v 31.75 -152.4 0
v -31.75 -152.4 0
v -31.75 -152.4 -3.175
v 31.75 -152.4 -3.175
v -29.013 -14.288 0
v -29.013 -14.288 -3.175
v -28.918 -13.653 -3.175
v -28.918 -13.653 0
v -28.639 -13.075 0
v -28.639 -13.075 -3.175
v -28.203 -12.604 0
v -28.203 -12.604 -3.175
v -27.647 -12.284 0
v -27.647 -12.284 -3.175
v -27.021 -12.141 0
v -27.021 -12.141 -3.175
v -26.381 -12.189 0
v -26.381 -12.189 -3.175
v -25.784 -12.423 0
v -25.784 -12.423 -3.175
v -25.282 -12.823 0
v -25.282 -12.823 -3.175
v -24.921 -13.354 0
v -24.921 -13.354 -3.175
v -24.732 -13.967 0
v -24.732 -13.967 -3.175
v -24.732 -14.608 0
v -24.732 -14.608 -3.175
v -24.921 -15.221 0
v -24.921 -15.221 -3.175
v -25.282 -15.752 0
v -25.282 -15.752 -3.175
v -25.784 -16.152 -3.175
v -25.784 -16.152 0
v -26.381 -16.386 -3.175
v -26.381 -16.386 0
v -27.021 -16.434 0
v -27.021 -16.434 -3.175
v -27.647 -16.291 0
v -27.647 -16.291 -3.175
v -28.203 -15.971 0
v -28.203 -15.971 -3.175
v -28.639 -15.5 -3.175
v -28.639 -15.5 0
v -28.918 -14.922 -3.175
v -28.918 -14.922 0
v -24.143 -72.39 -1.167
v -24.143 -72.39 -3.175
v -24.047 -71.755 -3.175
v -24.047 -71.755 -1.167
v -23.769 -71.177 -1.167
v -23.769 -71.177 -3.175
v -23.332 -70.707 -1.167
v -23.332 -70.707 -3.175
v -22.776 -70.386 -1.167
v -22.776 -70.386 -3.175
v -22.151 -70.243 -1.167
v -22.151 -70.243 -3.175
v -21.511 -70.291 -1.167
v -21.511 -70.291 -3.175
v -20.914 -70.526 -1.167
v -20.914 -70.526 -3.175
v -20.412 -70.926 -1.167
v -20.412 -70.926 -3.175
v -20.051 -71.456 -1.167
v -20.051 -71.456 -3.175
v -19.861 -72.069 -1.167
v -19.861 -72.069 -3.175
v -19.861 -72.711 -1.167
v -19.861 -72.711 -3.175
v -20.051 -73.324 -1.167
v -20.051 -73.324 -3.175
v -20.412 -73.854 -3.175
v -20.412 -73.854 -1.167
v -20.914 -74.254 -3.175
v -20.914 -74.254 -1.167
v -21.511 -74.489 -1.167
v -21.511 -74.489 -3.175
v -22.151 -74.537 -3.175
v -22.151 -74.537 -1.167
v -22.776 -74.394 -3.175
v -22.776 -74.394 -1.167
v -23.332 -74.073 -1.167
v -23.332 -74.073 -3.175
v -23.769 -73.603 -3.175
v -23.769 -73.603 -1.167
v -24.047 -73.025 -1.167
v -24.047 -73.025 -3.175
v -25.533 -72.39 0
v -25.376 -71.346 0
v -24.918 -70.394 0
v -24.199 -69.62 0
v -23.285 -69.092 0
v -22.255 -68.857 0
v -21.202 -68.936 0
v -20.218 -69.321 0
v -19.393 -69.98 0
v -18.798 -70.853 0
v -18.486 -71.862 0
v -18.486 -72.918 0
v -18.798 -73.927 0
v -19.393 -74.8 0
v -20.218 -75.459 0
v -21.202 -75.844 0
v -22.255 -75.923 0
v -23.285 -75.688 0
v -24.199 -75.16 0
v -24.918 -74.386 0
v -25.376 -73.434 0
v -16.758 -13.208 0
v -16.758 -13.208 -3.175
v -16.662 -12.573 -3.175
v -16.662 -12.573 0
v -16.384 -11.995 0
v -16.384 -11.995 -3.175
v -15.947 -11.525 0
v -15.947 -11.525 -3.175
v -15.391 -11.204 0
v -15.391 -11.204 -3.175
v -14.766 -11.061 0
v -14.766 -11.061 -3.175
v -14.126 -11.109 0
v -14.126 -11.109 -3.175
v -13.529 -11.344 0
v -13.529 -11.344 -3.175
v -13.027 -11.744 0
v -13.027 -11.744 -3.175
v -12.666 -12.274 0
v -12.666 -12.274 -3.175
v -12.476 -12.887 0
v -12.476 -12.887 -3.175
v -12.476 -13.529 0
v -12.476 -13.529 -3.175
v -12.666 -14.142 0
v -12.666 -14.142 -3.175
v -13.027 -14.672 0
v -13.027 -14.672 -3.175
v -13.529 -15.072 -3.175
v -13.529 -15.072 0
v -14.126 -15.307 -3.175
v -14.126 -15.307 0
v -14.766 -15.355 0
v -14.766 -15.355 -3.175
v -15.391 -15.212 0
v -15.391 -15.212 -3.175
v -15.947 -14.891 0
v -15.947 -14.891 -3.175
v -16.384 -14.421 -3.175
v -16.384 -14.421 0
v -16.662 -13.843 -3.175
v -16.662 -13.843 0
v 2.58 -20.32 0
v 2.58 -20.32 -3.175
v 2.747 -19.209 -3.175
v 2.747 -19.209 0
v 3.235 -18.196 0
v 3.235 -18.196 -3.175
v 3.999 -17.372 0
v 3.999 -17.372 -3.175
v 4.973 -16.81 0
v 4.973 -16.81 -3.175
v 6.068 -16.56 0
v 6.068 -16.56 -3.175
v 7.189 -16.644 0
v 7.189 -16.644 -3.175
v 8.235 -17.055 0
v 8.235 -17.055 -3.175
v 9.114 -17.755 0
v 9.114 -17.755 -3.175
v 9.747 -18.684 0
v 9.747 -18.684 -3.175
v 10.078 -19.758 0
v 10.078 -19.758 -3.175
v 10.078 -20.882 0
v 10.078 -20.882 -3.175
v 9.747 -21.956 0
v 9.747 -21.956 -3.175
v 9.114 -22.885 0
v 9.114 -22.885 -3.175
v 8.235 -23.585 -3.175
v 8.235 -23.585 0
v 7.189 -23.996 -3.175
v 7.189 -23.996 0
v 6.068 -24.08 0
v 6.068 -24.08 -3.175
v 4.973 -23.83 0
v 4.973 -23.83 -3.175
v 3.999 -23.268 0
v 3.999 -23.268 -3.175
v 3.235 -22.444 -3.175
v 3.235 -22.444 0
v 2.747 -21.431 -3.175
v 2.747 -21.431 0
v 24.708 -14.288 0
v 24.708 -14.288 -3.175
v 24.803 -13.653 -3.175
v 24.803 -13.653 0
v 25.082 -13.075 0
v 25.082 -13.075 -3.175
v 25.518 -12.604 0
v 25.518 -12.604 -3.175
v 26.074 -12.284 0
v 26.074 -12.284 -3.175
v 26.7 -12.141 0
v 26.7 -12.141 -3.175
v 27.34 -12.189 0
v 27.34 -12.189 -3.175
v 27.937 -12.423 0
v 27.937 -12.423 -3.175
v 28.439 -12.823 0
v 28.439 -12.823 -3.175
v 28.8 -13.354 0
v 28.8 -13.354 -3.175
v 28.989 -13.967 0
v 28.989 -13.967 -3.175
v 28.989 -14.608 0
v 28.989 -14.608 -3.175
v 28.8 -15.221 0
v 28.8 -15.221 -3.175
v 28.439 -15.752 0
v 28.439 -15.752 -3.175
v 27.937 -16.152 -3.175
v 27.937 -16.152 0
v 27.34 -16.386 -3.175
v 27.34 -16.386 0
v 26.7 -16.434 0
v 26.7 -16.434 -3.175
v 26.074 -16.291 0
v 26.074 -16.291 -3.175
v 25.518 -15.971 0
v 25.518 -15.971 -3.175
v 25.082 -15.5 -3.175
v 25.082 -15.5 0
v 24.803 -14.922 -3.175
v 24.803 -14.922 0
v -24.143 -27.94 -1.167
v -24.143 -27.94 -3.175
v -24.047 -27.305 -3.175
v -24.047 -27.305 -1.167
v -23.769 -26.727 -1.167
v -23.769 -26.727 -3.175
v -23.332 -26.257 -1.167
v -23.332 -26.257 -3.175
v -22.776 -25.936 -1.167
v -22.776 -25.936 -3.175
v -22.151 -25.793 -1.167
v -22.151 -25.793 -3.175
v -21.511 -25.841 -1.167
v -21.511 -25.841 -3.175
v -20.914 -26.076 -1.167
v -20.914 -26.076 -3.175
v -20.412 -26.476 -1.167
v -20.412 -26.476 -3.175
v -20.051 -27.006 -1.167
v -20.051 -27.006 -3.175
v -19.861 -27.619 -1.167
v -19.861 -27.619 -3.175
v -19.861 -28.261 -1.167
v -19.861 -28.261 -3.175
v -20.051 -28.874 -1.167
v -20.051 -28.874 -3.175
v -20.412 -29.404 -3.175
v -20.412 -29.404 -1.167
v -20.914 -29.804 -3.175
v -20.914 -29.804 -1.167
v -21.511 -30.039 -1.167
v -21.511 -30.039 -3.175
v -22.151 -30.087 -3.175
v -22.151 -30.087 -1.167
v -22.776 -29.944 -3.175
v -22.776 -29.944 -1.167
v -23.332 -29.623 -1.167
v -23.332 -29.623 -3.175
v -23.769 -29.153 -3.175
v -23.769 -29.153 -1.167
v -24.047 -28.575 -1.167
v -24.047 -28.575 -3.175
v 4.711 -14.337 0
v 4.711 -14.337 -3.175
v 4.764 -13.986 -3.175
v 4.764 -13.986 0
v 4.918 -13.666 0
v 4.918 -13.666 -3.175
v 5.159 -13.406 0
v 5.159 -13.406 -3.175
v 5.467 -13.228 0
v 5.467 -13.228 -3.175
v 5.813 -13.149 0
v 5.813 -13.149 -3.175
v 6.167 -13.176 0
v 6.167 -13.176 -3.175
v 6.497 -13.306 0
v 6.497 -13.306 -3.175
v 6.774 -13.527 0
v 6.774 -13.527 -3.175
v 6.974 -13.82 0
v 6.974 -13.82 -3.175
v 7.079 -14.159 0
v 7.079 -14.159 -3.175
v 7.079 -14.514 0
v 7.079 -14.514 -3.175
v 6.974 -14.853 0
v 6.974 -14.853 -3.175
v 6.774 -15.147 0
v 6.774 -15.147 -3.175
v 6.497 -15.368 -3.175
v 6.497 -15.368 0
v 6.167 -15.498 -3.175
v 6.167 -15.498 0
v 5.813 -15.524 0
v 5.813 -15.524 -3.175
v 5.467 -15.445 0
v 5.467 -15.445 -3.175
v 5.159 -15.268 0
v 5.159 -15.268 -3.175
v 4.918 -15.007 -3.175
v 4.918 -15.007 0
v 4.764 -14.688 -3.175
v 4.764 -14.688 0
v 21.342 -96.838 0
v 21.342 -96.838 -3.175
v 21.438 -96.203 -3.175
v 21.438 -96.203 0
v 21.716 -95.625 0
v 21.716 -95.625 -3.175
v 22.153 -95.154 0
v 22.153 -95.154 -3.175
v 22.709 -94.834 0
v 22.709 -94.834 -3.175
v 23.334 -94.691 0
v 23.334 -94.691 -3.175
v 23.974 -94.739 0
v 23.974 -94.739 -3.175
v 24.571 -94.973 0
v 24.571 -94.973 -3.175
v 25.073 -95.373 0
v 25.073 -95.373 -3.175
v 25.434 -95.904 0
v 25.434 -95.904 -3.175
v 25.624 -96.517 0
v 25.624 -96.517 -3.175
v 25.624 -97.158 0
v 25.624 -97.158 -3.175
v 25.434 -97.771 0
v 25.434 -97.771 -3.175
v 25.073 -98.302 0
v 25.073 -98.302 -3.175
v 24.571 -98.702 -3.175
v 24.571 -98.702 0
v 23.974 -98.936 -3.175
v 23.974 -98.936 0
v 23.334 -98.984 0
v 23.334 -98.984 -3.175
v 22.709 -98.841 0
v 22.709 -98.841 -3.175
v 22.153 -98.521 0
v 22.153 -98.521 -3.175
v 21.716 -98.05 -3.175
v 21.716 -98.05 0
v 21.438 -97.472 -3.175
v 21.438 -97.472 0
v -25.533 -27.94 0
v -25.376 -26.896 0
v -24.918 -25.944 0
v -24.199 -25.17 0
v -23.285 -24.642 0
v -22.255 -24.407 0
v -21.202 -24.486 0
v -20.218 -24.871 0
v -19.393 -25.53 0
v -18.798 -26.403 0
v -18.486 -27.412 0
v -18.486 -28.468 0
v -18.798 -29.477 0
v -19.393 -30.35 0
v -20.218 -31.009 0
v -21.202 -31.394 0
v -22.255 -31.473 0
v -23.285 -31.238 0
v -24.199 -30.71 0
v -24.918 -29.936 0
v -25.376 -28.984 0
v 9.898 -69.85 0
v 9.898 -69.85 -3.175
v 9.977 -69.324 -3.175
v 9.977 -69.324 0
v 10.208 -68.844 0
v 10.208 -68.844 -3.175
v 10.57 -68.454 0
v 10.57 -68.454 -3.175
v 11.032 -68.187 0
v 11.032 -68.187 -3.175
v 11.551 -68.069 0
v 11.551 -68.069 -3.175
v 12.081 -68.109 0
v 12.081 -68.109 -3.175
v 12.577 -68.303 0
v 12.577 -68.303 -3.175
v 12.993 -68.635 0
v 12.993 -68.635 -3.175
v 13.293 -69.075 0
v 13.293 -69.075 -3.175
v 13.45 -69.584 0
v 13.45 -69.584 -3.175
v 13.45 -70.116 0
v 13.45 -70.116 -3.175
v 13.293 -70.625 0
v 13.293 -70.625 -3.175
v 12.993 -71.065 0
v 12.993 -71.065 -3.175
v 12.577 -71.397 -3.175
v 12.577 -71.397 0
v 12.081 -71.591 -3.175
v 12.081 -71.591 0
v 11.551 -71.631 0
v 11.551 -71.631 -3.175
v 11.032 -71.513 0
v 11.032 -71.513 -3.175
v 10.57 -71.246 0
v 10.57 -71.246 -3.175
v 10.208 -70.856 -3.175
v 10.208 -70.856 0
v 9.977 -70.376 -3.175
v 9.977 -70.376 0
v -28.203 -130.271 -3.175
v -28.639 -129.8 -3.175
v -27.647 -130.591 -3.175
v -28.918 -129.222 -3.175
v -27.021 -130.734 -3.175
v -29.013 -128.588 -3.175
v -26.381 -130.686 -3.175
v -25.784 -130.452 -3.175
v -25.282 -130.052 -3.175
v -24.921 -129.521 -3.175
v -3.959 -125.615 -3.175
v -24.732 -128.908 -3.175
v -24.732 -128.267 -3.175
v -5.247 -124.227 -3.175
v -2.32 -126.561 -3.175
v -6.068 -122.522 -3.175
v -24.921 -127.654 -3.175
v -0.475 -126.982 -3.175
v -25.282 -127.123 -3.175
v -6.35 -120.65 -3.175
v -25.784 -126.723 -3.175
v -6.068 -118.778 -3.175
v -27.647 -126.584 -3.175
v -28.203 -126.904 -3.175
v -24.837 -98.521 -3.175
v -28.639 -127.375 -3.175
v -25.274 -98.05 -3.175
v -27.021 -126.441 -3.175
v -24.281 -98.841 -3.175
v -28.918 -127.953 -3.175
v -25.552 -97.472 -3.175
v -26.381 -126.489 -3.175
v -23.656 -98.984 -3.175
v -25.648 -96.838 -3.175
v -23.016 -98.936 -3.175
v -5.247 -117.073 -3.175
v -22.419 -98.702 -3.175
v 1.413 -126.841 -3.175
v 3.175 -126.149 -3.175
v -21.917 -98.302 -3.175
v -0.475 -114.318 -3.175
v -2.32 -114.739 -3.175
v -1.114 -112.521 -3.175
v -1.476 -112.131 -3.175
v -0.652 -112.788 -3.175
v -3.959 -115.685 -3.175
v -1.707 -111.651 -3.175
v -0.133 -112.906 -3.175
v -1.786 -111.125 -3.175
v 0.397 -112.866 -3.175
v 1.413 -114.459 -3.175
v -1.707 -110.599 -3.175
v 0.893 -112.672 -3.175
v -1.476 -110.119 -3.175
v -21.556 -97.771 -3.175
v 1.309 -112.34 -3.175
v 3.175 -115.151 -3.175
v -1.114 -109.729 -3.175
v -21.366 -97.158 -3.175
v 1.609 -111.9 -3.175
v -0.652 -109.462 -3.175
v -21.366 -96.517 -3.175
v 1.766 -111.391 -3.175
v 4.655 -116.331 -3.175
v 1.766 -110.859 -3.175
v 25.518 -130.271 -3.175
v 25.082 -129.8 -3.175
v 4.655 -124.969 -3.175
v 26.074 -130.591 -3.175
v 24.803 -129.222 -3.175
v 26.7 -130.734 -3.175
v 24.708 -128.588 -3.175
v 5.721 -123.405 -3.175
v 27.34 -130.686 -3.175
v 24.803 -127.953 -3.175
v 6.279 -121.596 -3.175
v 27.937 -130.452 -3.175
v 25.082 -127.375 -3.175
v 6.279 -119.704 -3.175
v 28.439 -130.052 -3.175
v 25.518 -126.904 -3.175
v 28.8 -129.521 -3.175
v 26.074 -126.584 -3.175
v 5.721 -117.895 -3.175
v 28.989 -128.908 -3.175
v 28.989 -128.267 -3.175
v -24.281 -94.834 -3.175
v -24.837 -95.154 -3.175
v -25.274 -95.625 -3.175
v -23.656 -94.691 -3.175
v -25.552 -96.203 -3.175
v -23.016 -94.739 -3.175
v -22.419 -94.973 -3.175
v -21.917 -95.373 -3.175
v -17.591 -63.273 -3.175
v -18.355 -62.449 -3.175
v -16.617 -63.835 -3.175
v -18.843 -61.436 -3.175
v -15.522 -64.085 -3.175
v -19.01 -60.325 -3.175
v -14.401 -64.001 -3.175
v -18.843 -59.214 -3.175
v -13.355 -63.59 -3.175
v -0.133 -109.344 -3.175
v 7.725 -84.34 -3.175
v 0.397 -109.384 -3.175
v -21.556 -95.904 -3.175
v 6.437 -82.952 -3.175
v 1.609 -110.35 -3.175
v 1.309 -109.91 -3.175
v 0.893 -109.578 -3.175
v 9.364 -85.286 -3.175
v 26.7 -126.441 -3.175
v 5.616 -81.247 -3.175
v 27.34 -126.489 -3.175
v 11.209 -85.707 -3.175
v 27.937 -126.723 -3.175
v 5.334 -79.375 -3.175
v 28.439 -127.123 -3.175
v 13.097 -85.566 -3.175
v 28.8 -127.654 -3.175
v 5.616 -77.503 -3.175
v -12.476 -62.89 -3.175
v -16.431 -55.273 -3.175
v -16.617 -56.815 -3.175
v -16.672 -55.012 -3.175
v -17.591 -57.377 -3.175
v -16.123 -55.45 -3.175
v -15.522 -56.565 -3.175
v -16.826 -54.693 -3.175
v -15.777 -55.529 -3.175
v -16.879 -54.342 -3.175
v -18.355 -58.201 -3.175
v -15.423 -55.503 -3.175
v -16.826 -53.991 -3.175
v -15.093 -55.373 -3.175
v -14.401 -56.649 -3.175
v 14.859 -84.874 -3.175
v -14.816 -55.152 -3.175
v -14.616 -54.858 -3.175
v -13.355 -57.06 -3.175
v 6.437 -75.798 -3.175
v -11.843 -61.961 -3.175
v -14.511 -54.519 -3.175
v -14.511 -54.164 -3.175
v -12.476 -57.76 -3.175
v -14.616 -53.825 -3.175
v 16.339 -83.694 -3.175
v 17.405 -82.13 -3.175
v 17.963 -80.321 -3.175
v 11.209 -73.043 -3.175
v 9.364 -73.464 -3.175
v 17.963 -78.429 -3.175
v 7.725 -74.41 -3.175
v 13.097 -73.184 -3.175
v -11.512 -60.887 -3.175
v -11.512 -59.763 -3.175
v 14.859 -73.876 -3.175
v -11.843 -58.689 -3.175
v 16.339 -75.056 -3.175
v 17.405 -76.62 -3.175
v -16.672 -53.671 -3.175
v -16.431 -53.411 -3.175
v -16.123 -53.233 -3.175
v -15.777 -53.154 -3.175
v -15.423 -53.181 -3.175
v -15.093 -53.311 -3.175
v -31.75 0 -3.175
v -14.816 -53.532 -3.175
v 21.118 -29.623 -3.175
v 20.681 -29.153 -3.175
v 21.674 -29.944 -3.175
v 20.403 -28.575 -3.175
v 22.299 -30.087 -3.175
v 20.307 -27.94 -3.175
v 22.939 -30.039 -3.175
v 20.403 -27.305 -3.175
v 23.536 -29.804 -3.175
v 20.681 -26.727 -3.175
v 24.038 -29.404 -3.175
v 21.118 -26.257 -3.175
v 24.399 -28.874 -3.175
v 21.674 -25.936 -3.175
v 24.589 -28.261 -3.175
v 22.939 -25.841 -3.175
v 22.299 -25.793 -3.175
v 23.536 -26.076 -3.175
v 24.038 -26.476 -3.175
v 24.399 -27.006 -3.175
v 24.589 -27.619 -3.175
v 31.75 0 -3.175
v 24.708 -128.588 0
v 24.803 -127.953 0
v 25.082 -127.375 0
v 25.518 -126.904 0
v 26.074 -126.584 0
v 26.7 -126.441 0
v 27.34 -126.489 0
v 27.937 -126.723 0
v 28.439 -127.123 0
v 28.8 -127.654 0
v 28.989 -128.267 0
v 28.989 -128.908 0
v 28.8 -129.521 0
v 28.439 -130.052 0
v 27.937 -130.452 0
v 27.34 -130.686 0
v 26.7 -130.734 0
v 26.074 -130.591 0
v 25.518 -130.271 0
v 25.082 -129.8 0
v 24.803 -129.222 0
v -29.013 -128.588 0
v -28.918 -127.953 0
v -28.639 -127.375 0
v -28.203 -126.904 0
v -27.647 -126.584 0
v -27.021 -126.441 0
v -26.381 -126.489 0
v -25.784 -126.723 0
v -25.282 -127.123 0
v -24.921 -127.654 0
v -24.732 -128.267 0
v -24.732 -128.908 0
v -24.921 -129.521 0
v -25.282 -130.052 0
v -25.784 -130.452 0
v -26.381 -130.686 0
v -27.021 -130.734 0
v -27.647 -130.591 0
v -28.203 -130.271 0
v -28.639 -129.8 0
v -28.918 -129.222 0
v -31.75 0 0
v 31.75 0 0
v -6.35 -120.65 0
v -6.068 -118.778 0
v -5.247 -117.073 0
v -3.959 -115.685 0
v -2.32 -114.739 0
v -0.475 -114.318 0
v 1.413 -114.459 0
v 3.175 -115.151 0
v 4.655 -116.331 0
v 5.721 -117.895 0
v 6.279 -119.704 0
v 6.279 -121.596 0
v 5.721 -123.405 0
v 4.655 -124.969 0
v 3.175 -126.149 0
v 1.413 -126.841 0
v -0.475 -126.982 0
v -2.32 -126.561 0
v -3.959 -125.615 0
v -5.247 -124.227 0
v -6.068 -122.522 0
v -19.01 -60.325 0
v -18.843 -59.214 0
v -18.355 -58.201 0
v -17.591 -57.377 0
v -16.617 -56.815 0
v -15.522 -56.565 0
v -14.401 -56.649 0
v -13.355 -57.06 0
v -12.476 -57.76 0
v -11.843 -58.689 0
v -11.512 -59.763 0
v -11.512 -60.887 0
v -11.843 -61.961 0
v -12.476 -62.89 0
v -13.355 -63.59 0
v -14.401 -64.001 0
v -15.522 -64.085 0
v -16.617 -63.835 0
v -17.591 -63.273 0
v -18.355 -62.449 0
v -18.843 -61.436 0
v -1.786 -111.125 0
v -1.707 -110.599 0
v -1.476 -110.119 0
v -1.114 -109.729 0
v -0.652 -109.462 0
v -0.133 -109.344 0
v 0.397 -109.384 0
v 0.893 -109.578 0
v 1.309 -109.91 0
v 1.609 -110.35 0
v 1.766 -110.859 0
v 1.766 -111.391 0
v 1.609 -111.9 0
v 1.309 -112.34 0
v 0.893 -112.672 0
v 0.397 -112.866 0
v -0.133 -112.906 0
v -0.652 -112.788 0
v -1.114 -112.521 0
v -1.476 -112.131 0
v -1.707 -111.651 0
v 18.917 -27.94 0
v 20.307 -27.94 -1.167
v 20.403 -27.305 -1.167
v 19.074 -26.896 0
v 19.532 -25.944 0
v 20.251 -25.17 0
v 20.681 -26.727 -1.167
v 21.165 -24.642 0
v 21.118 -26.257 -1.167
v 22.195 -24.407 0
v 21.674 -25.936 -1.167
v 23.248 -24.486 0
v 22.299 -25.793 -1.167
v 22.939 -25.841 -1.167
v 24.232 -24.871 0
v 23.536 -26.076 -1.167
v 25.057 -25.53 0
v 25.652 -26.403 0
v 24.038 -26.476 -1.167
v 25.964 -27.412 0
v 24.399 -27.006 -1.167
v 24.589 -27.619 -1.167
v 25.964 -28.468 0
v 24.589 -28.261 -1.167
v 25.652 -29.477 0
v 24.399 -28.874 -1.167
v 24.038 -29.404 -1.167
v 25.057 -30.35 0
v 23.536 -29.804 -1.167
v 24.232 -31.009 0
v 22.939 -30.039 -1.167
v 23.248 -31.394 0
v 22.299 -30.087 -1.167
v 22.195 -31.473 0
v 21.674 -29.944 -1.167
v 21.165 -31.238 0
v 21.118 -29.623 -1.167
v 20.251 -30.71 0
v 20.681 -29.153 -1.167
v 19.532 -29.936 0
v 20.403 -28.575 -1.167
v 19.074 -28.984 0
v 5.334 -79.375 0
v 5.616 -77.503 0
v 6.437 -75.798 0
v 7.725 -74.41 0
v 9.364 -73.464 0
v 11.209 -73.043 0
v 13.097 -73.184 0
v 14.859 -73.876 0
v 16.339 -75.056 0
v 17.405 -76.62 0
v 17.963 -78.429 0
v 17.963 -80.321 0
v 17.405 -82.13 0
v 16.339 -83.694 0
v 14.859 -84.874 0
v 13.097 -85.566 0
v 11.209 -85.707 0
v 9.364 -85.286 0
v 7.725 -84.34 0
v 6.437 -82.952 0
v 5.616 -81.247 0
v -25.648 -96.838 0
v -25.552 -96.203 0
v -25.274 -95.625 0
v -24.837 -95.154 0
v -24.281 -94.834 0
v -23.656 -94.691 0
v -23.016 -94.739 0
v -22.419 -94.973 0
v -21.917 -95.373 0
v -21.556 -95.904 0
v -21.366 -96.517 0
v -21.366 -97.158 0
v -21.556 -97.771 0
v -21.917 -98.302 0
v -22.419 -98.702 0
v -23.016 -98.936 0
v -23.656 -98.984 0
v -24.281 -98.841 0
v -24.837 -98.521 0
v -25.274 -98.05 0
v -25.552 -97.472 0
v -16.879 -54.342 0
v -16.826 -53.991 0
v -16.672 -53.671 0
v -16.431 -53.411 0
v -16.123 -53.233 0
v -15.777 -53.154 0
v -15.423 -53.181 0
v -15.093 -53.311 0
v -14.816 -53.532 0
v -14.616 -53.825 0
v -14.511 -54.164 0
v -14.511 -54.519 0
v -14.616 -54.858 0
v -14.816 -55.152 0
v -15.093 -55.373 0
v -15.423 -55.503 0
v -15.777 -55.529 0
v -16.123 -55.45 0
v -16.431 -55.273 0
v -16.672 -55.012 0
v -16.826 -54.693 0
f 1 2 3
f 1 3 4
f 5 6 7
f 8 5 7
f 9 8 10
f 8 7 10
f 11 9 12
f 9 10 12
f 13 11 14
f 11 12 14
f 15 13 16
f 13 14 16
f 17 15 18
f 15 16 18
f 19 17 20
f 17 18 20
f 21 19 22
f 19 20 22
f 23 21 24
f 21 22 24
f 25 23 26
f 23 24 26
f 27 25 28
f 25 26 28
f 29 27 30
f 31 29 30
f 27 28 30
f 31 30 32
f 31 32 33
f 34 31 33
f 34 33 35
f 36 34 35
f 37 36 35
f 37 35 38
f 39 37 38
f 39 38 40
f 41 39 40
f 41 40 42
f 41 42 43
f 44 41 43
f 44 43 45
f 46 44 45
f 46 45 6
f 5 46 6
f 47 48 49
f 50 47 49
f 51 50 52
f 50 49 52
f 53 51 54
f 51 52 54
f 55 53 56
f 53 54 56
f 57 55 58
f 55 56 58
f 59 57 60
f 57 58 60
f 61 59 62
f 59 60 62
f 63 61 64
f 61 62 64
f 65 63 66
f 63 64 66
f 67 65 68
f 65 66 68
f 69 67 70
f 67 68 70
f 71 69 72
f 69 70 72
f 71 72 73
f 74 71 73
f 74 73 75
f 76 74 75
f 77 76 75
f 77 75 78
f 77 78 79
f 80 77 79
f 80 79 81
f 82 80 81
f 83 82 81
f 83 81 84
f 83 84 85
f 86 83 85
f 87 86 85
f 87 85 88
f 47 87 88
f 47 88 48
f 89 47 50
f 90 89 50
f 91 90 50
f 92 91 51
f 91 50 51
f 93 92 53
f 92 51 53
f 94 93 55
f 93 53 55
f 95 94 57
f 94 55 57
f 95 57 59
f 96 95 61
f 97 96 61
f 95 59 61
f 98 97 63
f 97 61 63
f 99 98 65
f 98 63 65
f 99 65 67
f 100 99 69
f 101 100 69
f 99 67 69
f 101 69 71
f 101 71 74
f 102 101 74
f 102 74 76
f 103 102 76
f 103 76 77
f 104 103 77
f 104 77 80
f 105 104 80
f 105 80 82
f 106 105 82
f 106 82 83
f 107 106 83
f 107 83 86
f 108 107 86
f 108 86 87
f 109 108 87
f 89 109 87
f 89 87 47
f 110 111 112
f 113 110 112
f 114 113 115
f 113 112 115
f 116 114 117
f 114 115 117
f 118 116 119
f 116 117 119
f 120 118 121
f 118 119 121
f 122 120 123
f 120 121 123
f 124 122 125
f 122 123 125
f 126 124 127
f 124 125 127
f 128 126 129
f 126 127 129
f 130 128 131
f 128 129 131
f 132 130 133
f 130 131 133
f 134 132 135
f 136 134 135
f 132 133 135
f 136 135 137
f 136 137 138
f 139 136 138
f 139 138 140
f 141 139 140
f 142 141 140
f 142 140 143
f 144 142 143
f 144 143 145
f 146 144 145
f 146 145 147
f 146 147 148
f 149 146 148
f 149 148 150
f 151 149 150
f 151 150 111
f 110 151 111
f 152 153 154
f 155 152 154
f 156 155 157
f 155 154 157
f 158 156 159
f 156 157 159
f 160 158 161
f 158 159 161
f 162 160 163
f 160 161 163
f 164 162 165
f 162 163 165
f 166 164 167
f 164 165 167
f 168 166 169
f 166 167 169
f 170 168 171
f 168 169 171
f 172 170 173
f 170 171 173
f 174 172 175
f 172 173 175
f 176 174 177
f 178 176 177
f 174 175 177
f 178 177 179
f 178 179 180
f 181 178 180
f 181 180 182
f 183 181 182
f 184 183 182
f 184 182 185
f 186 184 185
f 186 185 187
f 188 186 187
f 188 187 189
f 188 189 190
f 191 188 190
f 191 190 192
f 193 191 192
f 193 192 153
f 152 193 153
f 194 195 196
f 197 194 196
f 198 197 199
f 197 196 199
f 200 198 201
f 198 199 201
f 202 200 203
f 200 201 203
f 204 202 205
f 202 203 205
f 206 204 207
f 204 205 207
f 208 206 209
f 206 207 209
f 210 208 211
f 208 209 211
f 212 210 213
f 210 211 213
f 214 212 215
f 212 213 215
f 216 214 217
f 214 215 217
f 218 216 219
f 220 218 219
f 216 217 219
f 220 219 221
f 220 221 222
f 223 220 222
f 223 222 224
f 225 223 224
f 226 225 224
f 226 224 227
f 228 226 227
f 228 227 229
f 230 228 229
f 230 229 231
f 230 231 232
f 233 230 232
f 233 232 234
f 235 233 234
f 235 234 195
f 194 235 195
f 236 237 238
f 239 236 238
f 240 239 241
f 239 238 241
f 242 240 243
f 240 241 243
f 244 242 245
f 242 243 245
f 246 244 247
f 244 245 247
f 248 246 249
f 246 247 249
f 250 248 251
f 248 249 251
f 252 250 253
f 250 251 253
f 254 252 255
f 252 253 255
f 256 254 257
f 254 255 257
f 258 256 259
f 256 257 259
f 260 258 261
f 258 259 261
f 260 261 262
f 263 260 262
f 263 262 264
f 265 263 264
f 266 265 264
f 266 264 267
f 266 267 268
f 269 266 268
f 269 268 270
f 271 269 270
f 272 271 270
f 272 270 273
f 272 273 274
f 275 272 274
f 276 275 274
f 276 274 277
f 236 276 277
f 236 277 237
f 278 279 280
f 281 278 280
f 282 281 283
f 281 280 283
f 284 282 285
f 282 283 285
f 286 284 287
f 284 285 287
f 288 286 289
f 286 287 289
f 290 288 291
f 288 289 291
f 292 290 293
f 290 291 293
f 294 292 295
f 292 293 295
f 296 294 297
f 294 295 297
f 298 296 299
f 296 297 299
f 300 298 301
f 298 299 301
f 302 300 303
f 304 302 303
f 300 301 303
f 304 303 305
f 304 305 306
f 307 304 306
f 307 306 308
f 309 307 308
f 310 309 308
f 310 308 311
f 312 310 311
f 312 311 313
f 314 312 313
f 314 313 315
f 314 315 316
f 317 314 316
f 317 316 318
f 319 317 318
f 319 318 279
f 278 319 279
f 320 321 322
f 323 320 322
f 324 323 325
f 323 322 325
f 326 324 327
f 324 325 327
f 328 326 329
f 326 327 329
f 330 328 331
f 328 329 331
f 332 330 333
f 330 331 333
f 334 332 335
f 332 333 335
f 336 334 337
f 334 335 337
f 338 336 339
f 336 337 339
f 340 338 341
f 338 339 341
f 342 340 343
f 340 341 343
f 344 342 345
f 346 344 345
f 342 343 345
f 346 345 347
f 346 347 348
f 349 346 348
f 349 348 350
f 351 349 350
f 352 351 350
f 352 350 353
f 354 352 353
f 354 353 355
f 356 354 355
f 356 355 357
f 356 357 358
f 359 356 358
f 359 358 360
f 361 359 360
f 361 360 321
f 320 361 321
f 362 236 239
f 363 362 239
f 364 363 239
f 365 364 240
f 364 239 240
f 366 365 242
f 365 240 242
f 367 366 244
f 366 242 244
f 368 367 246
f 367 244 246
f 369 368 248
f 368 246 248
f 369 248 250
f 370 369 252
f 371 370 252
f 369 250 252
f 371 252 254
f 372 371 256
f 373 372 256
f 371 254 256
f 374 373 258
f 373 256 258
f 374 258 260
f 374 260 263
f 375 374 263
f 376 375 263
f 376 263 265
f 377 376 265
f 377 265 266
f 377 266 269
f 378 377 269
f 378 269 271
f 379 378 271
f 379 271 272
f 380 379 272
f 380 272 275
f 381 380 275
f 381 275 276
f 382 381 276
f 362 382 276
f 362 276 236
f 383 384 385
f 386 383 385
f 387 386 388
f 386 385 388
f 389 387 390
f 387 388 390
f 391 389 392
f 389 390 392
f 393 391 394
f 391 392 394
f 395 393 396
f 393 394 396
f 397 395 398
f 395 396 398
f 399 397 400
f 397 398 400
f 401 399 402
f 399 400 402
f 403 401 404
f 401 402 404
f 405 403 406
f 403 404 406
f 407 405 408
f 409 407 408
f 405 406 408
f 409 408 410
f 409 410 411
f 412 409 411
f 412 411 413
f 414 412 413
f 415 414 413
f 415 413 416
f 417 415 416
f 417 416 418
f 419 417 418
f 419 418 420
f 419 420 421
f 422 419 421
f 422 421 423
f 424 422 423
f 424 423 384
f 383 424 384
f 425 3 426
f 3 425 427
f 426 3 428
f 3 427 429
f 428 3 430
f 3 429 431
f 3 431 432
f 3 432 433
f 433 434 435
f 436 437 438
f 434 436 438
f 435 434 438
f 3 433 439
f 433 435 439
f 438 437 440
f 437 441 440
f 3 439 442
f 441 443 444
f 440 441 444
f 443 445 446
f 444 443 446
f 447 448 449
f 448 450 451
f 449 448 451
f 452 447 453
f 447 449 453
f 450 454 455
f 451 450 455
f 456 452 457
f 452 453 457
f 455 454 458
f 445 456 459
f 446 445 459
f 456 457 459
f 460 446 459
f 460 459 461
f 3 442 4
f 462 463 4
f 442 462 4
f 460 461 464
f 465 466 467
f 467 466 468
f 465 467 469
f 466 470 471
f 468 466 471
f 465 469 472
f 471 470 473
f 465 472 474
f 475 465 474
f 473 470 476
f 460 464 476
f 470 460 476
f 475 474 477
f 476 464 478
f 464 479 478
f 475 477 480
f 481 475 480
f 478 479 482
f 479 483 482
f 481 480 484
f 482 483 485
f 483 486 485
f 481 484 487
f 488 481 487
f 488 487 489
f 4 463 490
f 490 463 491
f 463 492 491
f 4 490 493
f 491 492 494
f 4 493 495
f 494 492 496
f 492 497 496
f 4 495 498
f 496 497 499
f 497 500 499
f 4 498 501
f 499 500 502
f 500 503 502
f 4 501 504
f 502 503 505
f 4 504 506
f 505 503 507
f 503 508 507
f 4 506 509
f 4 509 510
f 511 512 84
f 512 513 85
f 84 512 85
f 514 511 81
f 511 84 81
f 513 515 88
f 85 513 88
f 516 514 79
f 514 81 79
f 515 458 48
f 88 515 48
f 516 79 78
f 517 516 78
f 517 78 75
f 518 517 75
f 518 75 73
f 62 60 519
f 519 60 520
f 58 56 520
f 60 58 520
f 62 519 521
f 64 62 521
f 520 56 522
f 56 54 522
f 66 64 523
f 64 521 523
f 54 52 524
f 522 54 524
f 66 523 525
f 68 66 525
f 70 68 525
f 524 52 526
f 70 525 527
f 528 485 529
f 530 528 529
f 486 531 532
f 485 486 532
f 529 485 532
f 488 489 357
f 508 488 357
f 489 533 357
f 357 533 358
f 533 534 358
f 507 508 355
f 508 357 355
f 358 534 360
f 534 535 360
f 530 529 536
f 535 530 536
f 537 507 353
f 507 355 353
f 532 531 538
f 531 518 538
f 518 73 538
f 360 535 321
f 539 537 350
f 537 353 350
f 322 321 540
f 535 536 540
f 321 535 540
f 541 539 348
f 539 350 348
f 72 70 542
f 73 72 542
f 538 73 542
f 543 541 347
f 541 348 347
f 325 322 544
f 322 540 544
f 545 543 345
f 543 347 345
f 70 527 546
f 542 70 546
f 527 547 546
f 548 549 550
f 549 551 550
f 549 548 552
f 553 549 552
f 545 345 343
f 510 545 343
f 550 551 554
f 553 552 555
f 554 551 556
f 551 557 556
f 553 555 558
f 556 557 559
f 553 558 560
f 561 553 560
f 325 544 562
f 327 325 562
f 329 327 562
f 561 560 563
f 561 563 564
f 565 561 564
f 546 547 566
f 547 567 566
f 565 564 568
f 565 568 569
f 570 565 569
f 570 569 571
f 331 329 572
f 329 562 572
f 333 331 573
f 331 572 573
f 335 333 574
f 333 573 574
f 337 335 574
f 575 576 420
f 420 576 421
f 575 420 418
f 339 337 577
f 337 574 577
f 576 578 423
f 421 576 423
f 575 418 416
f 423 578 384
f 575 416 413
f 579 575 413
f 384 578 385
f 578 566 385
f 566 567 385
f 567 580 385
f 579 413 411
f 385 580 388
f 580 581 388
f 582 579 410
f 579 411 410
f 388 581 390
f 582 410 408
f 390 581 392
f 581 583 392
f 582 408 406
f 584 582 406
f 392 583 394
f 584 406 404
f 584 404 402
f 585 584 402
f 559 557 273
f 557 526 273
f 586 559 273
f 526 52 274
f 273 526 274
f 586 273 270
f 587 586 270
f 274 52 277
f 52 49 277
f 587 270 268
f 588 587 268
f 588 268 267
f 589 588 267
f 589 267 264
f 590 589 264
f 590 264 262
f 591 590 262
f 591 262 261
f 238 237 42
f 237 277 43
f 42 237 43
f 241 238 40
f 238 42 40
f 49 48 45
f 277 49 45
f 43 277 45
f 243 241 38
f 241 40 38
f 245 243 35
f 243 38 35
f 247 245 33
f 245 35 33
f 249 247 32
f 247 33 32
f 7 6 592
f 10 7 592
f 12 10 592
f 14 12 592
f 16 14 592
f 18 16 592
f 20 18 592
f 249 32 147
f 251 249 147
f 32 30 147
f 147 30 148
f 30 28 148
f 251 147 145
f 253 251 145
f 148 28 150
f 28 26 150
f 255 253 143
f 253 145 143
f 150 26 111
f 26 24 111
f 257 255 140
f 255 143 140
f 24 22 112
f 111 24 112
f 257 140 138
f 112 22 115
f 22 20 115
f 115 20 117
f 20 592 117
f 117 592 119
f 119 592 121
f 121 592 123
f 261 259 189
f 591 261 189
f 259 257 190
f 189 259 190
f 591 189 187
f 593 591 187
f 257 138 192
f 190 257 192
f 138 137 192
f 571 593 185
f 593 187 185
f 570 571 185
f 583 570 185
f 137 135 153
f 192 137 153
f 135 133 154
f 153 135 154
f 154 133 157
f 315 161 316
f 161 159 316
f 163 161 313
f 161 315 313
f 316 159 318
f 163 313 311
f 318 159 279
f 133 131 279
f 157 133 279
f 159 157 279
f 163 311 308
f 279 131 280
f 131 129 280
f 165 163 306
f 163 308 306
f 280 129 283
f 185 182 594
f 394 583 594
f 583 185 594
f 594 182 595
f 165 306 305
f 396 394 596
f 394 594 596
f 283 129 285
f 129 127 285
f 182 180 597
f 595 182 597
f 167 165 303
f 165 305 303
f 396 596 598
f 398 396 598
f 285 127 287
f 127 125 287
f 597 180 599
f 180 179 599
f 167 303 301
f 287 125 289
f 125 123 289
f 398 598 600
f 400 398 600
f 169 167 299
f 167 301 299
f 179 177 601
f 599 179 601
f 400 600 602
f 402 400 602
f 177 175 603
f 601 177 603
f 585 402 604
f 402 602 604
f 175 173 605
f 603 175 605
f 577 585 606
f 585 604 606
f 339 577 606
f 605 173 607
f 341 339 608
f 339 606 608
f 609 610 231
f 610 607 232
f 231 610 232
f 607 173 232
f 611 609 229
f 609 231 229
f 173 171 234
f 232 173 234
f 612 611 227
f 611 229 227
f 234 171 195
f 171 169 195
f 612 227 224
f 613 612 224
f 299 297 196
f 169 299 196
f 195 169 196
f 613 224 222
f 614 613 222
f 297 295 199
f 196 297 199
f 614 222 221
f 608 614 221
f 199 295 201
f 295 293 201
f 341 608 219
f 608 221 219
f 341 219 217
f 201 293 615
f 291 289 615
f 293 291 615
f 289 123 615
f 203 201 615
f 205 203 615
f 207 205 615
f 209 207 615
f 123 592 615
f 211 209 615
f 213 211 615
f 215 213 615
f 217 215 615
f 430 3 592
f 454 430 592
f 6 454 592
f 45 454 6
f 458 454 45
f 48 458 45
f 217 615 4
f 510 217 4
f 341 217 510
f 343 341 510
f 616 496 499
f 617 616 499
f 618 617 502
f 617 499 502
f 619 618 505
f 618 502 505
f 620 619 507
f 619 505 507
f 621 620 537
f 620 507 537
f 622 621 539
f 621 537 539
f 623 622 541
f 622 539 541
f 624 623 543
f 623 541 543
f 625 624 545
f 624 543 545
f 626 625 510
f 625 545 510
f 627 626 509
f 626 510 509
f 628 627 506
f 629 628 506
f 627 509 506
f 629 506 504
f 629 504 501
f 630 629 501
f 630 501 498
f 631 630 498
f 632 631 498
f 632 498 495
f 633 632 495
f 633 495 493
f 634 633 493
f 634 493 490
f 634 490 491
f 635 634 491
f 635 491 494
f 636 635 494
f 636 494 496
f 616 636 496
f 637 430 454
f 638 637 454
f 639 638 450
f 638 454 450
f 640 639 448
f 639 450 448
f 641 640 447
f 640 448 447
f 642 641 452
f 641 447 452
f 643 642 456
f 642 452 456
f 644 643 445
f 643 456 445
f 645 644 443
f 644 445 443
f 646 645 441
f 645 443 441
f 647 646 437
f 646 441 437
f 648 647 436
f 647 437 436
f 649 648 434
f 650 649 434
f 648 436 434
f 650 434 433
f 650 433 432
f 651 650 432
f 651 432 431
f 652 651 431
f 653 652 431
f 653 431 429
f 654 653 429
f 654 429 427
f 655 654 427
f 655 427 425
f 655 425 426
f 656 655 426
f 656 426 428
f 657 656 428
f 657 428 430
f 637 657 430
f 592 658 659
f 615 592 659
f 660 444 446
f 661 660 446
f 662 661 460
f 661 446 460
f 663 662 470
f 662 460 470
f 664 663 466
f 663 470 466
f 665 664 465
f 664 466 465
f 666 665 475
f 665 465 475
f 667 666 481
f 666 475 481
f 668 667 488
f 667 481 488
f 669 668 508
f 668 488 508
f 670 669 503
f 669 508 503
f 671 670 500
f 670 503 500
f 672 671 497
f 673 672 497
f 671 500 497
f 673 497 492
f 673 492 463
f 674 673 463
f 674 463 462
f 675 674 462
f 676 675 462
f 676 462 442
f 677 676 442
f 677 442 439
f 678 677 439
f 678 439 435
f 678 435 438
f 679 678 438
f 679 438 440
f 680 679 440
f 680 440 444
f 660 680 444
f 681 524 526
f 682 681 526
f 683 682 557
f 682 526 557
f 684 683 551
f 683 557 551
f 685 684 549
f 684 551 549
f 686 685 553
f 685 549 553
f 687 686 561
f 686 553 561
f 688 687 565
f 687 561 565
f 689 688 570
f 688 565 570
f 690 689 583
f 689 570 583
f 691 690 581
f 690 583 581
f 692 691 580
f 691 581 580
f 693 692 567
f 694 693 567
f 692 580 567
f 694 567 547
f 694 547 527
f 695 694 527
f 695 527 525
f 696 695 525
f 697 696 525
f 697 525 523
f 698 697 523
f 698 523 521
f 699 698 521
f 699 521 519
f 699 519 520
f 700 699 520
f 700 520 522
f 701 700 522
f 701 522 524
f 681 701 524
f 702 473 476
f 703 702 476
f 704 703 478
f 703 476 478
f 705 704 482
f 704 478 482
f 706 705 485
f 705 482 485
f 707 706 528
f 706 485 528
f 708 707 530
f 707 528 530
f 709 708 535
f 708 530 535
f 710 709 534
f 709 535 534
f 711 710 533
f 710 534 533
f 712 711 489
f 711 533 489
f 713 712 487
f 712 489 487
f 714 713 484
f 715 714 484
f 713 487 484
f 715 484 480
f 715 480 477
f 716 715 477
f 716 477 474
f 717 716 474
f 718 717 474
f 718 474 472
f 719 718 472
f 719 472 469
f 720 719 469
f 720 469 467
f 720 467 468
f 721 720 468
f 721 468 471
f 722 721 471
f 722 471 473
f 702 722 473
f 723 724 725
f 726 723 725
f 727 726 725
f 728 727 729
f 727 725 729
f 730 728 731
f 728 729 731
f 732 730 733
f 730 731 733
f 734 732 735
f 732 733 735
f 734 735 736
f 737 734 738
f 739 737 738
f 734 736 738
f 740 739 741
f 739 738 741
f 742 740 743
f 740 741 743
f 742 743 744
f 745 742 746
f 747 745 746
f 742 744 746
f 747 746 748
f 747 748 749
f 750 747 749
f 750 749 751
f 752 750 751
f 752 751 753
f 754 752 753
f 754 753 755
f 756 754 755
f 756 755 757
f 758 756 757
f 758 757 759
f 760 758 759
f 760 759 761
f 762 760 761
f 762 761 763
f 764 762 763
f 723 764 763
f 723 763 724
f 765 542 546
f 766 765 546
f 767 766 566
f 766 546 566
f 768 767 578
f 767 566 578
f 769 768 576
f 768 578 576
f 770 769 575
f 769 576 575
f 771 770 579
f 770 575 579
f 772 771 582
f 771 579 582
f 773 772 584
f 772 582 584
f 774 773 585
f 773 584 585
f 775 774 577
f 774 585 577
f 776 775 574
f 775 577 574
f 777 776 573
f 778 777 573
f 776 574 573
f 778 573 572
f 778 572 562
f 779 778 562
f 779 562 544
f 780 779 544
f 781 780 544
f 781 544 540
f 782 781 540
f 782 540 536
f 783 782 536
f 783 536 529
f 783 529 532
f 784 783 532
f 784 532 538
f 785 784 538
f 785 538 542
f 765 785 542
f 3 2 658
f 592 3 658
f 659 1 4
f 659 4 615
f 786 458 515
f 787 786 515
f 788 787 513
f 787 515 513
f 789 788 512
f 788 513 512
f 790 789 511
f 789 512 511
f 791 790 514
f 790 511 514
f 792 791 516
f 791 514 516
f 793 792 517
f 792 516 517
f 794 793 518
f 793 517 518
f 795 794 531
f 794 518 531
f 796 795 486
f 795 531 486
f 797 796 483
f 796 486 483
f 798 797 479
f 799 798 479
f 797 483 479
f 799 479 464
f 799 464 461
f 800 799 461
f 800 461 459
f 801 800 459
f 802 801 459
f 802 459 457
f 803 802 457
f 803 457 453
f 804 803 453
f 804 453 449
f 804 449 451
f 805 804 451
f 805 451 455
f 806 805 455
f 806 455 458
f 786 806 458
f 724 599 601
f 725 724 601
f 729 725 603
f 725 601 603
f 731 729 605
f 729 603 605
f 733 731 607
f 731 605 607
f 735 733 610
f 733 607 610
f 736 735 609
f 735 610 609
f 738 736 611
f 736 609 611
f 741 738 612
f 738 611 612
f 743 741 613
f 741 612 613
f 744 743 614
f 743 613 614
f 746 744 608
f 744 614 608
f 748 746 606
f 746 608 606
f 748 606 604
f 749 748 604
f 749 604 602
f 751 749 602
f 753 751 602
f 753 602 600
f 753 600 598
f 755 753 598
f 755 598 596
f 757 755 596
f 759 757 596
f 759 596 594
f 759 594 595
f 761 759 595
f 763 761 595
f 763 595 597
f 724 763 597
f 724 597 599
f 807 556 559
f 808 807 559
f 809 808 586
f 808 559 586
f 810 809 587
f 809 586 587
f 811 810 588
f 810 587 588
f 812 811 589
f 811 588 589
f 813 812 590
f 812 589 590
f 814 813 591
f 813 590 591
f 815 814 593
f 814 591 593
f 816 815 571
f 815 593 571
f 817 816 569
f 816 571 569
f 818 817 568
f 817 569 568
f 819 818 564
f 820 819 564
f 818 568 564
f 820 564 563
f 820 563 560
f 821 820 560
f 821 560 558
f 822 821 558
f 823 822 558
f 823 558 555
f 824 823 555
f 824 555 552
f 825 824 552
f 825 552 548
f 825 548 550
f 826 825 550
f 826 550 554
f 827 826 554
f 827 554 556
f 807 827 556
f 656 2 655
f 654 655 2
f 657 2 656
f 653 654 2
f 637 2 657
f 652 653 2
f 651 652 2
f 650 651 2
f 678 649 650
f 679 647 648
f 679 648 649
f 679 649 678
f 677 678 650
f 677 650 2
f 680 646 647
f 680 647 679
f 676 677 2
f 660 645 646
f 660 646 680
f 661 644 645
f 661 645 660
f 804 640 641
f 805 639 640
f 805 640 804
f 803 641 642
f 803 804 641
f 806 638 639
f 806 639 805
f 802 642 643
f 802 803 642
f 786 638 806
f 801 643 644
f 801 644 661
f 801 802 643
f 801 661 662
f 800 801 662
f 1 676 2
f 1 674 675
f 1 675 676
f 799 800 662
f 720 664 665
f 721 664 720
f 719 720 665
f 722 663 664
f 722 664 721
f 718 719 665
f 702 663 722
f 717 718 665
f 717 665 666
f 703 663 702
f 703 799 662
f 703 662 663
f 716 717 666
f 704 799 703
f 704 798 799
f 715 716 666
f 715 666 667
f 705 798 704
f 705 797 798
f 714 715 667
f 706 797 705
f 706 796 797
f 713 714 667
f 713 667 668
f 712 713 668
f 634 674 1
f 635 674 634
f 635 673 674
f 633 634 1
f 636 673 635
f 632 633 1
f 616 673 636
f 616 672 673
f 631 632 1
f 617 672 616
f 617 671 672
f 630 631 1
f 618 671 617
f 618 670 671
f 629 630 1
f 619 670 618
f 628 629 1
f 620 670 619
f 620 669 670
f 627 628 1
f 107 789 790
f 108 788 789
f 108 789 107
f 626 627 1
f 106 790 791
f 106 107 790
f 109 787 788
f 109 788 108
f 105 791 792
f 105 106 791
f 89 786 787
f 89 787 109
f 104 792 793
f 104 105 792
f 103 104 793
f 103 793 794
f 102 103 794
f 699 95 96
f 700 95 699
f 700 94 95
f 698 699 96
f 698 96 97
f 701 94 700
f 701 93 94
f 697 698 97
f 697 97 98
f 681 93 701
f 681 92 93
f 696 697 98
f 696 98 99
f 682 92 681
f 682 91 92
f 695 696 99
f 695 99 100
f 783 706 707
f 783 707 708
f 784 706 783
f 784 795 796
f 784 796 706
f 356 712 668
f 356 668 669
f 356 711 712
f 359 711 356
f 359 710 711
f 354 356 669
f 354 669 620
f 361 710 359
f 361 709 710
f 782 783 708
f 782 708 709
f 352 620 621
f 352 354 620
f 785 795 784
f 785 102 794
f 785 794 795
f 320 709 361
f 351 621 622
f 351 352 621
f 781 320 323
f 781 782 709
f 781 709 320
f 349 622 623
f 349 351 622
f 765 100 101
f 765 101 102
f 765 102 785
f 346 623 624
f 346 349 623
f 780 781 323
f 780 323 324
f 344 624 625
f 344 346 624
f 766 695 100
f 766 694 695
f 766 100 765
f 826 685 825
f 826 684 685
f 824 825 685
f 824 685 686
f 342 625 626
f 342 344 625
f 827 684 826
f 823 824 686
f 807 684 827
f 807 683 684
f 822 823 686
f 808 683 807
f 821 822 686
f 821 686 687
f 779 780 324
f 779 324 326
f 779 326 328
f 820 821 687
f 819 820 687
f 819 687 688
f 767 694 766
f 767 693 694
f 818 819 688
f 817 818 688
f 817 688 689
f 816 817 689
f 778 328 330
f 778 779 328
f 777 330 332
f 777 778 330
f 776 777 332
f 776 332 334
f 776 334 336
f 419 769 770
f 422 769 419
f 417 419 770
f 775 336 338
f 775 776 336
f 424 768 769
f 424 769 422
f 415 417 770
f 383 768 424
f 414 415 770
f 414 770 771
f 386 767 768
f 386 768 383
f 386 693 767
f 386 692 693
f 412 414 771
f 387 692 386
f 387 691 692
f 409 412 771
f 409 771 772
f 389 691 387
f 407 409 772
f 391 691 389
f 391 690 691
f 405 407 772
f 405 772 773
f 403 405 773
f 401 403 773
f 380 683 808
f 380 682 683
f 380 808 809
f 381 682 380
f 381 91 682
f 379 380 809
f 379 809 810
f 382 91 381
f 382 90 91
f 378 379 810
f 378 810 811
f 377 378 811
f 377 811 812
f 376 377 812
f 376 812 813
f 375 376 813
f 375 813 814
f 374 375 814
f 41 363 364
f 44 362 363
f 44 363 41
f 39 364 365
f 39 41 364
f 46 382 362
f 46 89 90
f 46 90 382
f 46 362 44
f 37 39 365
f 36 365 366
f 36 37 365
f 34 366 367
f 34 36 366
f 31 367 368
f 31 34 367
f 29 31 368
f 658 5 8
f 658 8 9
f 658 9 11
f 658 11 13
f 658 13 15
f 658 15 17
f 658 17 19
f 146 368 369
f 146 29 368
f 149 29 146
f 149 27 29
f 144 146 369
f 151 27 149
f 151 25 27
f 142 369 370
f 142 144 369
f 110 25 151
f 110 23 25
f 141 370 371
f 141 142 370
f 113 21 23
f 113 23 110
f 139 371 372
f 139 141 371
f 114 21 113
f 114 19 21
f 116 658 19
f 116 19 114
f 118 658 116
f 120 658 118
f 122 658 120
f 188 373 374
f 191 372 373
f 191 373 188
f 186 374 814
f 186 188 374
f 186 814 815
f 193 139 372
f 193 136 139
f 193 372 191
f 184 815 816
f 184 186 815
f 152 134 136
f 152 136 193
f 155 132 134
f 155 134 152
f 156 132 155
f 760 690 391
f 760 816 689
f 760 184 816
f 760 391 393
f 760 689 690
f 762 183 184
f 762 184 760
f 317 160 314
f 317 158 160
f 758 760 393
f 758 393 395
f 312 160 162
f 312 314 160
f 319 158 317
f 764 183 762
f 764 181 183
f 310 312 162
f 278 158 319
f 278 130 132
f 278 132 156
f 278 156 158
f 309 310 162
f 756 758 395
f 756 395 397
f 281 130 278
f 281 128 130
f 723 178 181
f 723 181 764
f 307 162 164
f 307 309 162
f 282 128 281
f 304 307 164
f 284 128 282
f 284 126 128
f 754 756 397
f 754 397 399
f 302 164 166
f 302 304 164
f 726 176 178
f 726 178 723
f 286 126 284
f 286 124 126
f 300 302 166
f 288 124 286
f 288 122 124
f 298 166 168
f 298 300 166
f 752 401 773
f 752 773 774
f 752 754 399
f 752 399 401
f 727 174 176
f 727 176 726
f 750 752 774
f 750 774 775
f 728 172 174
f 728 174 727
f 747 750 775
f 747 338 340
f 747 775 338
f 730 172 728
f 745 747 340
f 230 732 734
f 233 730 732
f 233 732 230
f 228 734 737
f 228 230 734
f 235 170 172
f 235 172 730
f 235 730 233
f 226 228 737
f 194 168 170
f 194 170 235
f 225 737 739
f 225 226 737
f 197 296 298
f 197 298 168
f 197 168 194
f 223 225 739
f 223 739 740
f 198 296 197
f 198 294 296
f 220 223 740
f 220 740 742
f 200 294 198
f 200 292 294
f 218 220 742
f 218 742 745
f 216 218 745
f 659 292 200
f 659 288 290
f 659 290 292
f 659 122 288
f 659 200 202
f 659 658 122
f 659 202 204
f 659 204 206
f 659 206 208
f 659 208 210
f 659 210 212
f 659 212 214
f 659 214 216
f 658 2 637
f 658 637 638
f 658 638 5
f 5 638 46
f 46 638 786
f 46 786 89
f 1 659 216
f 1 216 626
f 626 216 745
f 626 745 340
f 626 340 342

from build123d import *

# Parameters (mm, degrees)
SKETCH1_W                                         = 63.5
SKETCH1_H                                         = 152.4
BOSS_EXTRUDE1_DEPTH                               = 3.175
F_6_CLEARANCE_HOLE1_D                             = 4.3053
F_6_CLEARANCE_HOLE1_DEPTH                         = 3.175
F_6_CLEARANCE_HOLE2_D                             = 4.3053
F_6_CLEARANCE_HOLE2_DEPTH                         = 3.175
F_1_2_0_5_DIAMETER_HOLE1_D                        = 12.7
F_1_2_0_5_DIAMETER_HOLE1_DEPTH                    = 3.175
F_9_64_0_14063_DIAMETER_HOLE1_D                   = 3.572002
F_9_64_0_14063_DIAMETER_HOLE1_DEPTH               = 3.175
F_19_64_0_29688_DIAMETER_HOLE1_D                  = 7.540752
F_19_64_0_29688_DIAMETER_HOLE1_DEPTH              = 3.175
CSK_FOR_6_FLAT_HEAD_MACHINE_SCREW_100_D           = 4.3053
CSK_FOR_6_FLAT_HEAD_MACHINE_SCREW_100_DEPTH       = 3.175
CSK_FOR_6_FLAT_HEAD_MACHINE_SCREW_100_CSINK_D     = 7.0866
CSK_FOR_6_FLAT_HEAD_MACHINE_SCREW_100_CSINK_ANGLE = 100
F_3_32_0_09375_DIAMETER_HOLE1_D                   = 2.38125
F_3_32_0_09375_DIAMETER_HOLE1_DEPTH               = 3.175


with BuildPart() as part:
    # Sketch1 → Boss-Extrude1 (new body)
    with BuildSketch(Plane.XY):
        with Locations((0, -76.2)):
            Rectangle(SKETCH1_W, SKETCH1_H)
    extrude(amount=-BOSS_EXTRUDE1_DEPTH)

    # #6 Clearance Hole1
    with Locations(Plane.XY):
        with Locations((-26.8605, -14.2875), (26.8605, -14.2875), (26.8605, -128.5875), (-26.8605, -128.5875)):
            Hole(F_6_CLEARANCE_HOLE1_D / 2, depth=F_6_CLEARANCE_HOLE1_DEPTH)

    # #6 Clearance Hole2
    with Locations(Plane.XY):
        with Locations((-23.495, -96.8375), (23.495, -96.8375), (-14.605, -13.208)):
            Hole(F_6_CLEARANCE_HOLE2_D / 2, depth=F_6_CLEARANCE_HOLE2_DEPTH)

    # 1/2 (0.5) Diameter Hole1
    with Locations(Plane.XY):
        with Locations((11.684, -79.375), (0, -120.65)):
            Hole(F_1_2_0_5_DIAMETER_HOLE1_D / 2, depth=F_1_2_0_5_DIAMETER_HOLE1_DEPTH)

    # 9/64 (0.14063) Diameter Hole1
    with Locations(Plane.XY):
        with Locations((0, -111.125), (11.684, -69.85)):
            Hole(F_9_64_0_14063_DIAMETER_HOLE1_D / 2, depth=F_9_64_0_14063_DIAMETER_HOLE1_DEPTH)

    # 19/64 (0.29688) Diameter Hole1
    with Locations(Plane.XY):
        with Locations((-15.24, -60.325), (6.35, -20.32)):
            Hole(F_19_64_0_29688_DIAMETER_HOLE1_D / 2, depth=F_19_64_0_29688_DIAMETER_HOLE1_DEPTH)

    # CSK for #6 Flat Head Machine Screw (100)1
    with Locations(Plane.XY):
        with Locations((-21.99, -72.39), (-21.99, -27.94), (22.46, -27.94)):
            CounterSinkHole(CSK_FOR_6_FLAT_HEAD_MACHINE_SCREW_100_D / 2, CSK_FOR_6_FLAT_HEAD_MACHINE_SCREW_100_CSINK_D / 2, depth=CSK_FOR_6_FLAT_HEAD_MACHINE_SCREW_100_DEPTH, counter_sink_angle=CSK_FOR_6_FLAT_HEAD_MACHINE_SCREW_100_CSINK_ANGLE)

    # 3/32 (0.09375) Diameter Hole1
    with Locations(Plane.XY):
        with Locations((-15.688380535, -54.341777215), (5.901619465, -14.336777215)):
            Hole(F_3_32_0_09375_DIAMETER_HOLE1_D / 2, depth=F_3_32_0_09375_DIAMETER_HOLE1_DEPTH)


solid = part.part
